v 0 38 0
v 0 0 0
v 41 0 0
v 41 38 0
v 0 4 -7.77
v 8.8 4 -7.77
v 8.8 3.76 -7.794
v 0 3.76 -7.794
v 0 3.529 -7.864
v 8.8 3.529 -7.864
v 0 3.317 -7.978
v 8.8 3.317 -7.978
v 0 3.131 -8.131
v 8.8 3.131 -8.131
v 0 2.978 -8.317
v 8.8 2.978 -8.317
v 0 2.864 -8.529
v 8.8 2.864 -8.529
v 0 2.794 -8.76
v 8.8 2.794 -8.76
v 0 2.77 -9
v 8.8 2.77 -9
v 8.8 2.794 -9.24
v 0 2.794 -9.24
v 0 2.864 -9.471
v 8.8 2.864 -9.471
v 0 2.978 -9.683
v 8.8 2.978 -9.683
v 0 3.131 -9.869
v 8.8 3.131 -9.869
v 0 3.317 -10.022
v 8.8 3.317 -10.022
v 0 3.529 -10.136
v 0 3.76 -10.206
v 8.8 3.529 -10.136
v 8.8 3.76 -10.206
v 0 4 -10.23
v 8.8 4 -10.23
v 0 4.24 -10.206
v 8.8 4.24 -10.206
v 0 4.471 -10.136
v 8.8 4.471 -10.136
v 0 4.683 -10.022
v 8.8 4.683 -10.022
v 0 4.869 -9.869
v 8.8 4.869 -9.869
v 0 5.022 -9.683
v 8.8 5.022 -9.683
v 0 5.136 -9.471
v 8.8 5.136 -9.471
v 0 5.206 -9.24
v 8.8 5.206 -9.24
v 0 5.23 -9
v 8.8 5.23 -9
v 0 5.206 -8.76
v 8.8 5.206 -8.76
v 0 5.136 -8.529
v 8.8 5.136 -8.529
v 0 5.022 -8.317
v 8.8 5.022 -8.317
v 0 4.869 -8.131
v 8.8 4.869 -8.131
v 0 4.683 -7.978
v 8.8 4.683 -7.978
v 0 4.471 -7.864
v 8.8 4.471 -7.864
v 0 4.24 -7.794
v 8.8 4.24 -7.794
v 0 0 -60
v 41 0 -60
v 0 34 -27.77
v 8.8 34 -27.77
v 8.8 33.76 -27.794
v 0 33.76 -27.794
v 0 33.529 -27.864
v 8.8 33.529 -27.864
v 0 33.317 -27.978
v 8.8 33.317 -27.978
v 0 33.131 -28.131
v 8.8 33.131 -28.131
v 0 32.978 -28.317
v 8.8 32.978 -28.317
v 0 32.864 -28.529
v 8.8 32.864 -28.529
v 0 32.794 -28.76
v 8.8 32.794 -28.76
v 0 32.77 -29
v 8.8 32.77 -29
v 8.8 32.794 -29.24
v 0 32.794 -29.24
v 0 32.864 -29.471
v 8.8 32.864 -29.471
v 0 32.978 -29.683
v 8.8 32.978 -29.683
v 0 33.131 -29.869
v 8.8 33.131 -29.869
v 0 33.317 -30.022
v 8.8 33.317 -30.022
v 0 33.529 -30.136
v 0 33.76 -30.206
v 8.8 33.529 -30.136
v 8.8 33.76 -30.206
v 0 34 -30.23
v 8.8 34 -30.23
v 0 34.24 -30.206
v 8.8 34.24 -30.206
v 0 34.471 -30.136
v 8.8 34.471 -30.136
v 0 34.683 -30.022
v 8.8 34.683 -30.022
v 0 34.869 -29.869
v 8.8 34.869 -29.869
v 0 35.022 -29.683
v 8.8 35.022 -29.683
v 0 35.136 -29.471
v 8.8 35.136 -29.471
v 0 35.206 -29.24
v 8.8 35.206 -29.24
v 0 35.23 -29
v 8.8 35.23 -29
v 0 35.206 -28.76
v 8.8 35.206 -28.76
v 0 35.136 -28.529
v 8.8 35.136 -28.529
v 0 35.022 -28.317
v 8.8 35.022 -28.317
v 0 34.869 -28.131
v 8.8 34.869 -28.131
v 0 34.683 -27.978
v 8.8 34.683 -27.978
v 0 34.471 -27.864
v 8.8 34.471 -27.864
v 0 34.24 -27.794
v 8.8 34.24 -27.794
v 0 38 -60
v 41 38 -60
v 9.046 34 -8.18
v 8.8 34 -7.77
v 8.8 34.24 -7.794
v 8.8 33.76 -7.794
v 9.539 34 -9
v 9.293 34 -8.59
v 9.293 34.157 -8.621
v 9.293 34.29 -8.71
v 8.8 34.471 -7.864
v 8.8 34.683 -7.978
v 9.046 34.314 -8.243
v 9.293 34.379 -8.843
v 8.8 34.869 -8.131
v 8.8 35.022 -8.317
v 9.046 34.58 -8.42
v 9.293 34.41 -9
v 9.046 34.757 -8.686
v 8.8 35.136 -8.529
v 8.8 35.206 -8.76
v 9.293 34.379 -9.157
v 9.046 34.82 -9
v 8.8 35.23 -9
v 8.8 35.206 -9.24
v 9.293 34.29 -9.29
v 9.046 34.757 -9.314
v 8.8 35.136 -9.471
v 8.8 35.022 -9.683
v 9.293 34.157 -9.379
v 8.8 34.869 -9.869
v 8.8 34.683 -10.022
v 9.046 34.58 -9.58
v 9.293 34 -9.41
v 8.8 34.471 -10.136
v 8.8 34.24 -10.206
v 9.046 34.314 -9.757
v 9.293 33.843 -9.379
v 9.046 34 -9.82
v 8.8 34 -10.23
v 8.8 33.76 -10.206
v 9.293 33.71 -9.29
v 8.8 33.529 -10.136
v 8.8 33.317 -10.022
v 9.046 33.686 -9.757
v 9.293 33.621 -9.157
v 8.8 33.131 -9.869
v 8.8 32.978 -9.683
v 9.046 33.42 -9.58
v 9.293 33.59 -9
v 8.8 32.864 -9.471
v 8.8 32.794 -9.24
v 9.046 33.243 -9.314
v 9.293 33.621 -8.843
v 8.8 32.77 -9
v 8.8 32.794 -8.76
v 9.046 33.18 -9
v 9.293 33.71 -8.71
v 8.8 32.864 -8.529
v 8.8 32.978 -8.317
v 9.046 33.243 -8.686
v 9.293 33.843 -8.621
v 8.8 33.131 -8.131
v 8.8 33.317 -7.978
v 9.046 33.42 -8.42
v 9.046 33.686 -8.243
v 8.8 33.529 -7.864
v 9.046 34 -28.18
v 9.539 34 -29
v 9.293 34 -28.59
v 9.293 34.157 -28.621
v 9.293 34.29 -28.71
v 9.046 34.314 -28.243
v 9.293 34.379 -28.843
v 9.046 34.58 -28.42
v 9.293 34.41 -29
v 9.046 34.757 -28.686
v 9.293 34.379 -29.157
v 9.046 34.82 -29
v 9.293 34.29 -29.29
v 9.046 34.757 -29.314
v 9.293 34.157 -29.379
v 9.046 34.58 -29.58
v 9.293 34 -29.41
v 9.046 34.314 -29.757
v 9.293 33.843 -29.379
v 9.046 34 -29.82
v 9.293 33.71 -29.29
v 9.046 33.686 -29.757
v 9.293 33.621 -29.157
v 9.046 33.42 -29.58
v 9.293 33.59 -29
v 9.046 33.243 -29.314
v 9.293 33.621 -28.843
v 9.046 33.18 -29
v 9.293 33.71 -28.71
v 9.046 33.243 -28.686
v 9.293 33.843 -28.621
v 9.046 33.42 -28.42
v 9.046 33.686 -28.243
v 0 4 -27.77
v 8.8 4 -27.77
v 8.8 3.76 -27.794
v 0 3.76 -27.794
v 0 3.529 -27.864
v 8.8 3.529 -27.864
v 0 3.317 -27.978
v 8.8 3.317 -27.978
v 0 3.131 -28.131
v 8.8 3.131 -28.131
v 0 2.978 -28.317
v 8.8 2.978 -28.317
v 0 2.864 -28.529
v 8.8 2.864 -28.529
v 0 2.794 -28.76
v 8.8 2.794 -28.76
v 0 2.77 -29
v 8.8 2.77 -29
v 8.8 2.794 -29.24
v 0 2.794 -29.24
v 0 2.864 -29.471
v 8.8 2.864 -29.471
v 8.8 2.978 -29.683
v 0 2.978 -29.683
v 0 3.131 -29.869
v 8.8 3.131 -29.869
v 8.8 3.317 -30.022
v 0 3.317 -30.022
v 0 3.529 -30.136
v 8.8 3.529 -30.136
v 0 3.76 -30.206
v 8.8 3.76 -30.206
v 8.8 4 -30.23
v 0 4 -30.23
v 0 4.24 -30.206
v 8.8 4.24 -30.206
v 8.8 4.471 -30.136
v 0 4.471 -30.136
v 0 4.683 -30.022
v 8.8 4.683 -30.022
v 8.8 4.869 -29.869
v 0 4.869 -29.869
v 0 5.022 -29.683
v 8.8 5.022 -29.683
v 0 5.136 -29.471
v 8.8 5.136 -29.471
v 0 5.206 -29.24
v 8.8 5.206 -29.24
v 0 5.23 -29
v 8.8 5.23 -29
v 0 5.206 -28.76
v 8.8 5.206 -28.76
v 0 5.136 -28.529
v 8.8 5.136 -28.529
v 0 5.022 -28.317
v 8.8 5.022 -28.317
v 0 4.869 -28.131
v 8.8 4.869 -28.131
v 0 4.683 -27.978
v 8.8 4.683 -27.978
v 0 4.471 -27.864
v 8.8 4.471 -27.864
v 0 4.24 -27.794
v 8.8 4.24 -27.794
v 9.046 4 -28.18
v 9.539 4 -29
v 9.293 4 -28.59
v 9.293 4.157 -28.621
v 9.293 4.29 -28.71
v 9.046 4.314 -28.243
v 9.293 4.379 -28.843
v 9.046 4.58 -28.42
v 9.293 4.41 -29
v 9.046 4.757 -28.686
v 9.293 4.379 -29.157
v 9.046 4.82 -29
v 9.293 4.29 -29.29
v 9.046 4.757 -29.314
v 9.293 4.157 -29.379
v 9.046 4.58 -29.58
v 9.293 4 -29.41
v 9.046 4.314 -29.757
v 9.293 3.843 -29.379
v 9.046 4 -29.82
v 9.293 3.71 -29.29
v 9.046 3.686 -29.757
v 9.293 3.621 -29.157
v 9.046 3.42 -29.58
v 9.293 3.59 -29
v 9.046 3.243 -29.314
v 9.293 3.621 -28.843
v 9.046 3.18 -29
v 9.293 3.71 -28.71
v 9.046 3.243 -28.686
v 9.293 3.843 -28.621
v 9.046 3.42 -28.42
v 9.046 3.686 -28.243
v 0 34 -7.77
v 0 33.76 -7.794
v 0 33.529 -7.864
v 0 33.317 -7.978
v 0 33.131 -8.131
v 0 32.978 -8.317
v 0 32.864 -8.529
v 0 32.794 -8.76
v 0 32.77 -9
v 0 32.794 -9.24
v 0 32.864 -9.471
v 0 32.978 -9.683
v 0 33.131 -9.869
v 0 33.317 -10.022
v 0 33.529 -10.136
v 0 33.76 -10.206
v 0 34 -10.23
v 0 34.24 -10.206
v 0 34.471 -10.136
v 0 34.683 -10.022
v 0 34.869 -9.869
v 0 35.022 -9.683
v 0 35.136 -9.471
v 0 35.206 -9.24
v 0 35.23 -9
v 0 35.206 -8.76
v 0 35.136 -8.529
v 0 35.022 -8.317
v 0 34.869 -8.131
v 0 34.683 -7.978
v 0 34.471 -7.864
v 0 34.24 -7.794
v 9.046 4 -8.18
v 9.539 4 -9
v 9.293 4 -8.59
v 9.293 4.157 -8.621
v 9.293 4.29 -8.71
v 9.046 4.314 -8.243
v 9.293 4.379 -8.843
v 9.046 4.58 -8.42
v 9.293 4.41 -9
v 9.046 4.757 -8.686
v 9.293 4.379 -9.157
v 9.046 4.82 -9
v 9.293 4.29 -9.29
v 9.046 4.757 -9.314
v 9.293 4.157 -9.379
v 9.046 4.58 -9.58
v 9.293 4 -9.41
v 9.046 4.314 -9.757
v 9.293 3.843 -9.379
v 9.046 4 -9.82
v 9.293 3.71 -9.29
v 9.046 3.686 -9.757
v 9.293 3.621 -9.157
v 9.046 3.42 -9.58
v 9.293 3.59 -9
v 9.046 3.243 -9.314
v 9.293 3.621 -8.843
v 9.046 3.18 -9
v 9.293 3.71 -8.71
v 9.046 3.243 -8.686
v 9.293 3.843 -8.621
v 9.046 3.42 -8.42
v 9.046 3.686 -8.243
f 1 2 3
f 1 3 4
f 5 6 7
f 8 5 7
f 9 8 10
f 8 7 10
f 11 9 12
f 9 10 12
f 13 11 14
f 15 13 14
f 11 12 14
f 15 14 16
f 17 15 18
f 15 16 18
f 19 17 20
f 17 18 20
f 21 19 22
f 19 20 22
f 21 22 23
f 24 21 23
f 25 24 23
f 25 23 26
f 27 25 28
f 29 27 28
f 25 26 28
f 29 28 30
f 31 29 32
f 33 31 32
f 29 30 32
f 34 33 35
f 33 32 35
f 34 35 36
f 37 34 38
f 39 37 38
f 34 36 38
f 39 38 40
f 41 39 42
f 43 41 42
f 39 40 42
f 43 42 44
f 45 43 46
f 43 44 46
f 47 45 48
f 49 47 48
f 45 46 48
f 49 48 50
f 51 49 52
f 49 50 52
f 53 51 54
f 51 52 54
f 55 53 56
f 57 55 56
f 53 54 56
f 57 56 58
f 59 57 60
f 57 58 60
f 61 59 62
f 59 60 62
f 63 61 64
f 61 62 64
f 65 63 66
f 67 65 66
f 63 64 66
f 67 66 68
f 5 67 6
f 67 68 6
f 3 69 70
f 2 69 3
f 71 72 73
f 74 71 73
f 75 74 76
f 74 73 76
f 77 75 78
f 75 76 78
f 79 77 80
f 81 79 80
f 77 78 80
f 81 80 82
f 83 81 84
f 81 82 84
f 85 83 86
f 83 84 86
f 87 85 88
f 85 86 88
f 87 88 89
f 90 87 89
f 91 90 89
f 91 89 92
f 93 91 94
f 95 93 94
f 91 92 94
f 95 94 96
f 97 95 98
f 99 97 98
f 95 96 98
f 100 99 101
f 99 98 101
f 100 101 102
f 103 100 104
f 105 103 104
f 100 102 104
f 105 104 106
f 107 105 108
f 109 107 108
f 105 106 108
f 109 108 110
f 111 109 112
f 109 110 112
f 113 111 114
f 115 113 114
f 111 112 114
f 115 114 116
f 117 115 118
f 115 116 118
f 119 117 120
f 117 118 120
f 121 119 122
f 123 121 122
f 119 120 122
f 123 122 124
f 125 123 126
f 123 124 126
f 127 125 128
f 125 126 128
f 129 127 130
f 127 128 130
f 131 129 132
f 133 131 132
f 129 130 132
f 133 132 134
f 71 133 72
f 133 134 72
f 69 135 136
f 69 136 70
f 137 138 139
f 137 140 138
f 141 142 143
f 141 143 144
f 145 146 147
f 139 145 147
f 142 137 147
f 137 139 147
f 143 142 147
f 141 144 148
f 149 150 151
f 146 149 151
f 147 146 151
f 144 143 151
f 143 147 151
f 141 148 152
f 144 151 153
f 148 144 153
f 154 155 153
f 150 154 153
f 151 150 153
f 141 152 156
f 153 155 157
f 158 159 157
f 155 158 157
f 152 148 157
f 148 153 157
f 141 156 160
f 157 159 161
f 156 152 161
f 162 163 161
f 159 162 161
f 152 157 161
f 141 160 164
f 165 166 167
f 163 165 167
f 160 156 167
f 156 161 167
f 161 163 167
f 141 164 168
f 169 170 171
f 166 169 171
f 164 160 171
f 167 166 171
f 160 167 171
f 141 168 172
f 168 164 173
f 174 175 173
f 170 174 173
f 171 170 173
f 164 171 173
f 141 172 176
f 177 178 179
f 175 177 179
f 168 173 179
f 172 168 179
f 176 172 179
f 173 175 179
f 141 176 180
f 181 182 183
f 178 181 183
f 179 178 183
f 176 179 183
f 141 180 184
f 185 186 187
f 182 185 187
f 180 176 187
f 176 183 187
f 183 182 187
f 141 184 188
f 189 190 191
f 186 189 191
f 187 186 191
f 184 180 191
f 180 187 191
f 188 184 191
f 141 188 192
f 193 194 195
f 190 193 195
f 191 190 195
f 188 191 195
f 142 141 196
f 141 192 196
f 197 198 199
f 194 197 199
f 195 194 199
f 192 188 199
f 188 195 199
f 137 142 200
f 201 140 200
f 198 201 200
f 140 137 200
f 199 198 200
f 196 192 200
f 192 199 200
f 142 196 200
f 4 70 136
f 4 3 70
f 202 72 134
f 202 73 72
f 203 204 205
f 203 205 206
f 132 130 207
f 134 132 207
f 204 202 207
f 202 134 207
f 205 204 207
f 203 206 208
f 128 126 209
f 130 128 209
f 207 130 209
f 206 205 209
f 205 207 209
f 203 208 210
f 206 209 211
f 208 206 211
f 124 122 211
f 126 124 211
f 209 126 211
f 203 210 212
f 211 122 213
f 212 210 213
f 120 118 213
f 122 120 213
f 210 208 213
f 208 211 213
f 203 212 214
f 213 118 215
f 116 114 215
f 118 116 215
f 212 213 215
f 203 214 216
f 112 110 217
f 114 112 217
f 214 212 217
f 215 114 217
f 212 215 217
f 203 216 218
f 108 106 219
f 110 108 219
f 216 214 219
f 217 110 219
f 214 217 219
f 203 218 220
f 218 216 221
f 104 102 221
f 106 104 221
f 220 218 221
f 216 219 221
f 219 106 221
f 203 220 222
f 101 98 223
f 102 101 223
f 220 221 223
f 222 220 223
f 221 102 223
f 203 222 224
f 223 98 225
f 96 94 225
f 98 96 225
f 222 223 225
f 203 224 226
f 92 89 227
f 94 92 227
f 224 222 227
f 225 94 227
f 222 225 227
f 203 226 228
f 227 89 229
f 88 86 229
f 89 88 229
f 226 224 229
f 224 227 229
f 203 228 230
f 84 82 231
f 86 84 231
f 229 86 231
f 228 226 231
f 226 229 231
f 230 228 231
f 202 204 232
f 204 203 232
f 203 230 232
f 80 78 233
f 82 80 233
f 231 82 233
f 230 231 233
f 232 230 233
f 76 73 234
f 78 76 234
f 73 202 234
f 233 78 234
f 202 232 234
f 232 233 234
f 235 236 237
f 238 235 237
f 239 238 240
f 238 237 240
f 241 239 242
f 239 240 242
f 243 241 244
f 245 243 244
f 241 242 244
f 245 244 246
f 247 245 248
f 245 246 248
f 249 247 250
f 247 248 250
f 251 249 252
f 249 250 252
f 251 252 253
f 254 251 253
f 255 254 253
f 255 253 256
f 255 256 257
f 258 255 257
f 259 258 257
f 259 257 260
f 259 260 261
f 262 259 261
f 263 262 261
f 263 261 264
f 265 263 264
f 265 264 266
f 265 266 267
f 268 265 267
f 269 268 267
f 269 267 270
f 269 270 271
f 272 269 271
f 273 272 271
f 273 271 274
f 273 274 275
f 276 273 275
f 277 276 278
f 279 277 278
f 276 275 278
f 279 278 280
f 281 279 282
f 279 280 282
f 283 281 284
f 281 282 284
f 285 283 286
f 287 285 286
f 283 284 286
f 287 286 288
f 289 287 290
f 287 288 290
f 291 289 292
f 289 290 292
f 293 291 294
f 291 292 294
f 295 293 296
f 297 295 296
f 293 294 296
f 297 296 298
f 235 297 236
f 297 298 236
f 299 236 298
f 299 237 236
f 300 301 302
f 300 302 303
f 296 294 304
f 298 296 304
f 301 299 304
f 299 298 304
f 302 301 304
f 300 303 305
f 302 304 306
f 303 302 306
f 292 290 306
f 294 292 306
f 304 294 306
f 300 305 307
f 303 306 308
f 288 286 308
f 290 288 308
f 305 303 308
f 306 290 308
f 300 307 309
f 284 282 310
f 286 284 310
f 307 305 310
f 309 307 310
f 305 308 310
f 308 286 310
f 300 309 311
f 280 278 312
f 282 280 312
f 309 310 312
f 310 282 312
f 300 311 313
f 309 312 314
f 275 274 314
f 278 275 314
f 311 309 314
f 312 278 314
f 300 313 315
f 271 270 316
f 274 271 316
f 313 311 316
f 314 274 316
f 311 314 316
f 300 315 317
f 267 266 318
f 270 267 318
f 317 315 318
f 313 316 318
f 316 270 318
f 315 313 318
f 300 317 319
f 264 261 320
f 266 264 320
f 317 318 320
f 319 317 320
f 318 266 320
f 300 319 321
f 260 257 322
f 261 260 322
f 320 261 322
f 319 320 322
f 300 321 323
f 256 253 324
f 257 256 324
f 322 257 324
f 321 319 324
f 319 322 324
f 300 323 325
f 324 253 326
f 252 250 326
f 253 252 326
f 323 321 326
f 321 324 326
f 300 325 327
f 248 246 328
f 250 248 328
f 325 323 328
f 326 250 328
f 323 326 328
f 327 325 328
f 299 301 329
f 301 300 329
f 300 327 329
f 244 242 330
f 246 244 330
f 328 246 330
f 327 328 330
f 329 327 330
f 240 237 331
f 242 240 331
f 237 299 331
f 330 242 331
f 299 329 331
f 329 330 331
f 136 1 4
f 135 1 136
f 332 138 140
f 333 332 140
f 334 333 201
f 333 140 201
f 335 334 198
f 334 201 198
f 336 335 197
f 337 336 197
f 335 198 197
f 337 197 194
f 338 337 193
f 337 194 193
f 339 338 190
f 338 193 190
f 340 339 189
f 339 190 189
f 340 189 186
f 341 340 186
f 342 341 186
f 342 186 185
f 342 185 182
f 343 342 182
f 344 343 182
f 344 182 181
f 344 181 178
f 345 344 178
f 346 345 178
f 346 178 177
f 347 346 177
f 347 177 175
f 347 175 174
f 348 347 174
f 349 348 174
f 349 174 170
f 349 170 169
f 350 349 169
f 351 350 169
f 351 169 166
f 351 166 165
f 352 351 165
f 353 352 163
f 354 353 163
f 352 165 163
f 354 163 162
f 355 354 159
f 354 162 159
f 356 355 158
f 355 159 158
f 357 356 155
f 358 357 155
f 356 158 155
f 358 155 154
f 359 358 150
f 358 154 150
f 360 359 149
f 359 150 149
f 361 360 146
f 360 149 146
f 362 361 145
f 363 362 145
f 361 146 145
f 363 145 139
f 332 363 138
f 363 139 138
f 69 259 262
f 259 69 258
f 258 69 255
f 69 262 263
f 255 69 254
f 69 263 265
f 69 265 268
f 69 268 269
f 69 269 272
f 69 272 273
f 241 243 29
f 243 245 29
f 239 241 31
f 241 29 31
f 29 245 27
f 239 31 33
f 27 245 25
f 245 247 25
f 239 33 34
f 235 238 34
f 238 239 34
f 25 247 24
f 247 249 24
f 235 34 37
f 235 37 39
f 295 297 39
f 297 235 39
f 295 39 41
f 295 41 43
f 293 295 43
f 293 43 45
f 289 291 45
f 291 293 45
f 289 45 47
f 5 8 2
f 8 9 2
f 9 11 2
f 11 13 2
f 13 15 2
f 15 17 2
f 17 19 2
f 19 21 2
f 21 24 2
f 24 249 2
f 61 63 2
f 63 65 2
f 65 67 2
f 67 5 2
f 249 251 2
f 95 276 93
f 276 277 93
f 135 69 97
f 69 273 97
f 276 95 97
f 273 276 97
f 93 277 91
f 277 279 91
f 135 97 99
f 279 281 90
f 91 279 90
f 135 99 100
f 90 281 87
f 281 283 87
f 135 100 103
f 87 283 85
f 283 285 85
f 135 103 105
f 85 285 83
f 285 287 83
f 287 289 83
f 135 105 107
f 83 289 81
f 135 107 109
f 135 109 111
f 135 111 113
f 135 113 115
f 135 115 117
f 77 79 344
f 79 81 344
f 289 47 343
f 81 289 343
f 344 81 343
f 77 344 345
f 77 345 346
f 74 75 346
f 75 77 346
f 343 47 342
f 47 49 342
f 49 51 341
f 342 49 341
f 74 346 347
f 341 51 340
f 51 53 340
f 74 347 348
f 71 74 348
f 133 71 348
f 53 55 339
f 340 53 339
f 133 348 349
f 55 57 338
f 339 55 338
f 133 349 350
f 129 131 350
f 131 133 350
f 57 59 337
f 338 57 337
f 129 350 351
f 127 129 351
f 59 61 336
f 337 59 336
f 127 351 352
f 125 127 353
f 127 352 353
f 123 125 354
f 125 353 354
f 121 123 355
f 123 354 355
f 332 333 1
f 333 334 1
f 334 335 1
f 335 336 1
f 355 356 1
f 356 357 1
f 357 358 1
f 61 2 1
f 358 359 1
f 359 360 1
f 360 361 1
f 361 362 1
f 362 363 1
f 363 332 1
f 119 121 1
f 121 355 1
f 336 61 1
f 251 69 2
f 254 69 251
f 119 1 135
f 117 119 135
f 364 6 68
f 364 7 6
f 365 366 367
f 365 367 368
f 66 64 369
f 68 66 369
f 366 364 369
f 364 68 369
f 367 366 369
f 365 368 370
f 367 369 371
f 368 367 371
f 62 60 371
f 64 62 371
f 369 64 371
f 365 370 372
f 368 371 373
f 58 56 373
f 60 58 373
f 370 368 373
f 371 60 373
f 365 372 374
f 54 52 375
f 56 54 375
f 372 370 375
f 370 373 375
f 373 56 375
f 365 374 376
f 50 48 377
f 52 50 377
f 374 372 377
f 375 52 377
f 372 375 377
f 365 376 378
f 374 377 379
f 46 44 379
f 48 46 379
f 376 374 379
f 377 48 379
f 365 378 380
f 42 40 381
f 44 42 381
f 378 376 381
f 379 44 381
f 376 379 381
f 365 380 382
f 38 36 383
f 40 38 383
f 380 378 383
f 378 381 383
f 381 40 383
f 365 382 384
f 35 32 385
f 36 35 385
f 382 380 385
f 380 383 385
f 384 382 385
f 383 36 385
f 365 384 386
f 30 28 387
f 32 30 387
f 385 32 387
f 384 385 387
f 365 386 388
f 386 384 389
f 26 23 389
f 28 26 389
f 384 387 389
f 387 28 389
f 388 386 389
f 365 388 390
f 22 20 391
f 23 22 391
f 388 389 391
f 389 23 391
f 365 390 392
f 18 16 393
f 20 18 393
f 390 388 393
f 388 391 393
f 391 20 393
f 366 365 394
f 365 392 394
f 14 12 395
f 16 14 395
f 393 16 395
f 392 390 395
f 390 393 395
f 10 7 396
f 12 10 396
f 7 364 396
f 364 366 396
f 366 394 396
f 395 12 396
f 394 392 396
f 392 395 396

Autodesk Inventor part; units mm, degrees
ref_plane "YZ Plane" through (0, 0, 0) normal (1, 0, 0) x (0, 1, 0)
ref_plane "XZ Plane" through (0, 0, 0) normal (0, 1, 0) x (-1, 0, 0)
ref_plane "XY Plane" through (0, 0, 0) normal (0, 0, 1) x (1, 0, 0)
sketch "スケッチ1" plane through (0, 0, 0) normal (1, 0, 0) x (0, 1, 0)
  line L0 (0, 0) -> (38, 0)
  line L1 (38, 0) -> (38, -60)
  line L2 (38, -60) -> (0, -60)
  line L3 (0, -60) -> (0, 0)
  dimension "d0" = 60
  dimension "d1" = 38
extrude "押し出し1" add sketch "スケッチ1" along normal blind 41
sketch "スケッチ4" plane through (0, 0, 0) normal (-1, 0, 0) x (0, 0, 1)
  line L0 (0, 0) -> (-60, 0) projected
  line L1 (0, 38) -> (0, 0) projected
  point P0 (-29, 34)
  point P1 (-9, 34)
  point P2 (-9, 4)
  point P3 (-29, 4)
  dimension "d4" = 20
  dimension "d5" = 30
  dimension "d7" = 9
  dimension "d15" = 4
hole "穴1" at (0, 34, -29) at (0, 34, -9) at (0, 4, -9) at (0, 4, -29) direction (1, 0, 0) diameter 2.459 depth 8.8 tip angle 118 thread size "M3x0.5" class "6H" standard "ISO Metric profile"
